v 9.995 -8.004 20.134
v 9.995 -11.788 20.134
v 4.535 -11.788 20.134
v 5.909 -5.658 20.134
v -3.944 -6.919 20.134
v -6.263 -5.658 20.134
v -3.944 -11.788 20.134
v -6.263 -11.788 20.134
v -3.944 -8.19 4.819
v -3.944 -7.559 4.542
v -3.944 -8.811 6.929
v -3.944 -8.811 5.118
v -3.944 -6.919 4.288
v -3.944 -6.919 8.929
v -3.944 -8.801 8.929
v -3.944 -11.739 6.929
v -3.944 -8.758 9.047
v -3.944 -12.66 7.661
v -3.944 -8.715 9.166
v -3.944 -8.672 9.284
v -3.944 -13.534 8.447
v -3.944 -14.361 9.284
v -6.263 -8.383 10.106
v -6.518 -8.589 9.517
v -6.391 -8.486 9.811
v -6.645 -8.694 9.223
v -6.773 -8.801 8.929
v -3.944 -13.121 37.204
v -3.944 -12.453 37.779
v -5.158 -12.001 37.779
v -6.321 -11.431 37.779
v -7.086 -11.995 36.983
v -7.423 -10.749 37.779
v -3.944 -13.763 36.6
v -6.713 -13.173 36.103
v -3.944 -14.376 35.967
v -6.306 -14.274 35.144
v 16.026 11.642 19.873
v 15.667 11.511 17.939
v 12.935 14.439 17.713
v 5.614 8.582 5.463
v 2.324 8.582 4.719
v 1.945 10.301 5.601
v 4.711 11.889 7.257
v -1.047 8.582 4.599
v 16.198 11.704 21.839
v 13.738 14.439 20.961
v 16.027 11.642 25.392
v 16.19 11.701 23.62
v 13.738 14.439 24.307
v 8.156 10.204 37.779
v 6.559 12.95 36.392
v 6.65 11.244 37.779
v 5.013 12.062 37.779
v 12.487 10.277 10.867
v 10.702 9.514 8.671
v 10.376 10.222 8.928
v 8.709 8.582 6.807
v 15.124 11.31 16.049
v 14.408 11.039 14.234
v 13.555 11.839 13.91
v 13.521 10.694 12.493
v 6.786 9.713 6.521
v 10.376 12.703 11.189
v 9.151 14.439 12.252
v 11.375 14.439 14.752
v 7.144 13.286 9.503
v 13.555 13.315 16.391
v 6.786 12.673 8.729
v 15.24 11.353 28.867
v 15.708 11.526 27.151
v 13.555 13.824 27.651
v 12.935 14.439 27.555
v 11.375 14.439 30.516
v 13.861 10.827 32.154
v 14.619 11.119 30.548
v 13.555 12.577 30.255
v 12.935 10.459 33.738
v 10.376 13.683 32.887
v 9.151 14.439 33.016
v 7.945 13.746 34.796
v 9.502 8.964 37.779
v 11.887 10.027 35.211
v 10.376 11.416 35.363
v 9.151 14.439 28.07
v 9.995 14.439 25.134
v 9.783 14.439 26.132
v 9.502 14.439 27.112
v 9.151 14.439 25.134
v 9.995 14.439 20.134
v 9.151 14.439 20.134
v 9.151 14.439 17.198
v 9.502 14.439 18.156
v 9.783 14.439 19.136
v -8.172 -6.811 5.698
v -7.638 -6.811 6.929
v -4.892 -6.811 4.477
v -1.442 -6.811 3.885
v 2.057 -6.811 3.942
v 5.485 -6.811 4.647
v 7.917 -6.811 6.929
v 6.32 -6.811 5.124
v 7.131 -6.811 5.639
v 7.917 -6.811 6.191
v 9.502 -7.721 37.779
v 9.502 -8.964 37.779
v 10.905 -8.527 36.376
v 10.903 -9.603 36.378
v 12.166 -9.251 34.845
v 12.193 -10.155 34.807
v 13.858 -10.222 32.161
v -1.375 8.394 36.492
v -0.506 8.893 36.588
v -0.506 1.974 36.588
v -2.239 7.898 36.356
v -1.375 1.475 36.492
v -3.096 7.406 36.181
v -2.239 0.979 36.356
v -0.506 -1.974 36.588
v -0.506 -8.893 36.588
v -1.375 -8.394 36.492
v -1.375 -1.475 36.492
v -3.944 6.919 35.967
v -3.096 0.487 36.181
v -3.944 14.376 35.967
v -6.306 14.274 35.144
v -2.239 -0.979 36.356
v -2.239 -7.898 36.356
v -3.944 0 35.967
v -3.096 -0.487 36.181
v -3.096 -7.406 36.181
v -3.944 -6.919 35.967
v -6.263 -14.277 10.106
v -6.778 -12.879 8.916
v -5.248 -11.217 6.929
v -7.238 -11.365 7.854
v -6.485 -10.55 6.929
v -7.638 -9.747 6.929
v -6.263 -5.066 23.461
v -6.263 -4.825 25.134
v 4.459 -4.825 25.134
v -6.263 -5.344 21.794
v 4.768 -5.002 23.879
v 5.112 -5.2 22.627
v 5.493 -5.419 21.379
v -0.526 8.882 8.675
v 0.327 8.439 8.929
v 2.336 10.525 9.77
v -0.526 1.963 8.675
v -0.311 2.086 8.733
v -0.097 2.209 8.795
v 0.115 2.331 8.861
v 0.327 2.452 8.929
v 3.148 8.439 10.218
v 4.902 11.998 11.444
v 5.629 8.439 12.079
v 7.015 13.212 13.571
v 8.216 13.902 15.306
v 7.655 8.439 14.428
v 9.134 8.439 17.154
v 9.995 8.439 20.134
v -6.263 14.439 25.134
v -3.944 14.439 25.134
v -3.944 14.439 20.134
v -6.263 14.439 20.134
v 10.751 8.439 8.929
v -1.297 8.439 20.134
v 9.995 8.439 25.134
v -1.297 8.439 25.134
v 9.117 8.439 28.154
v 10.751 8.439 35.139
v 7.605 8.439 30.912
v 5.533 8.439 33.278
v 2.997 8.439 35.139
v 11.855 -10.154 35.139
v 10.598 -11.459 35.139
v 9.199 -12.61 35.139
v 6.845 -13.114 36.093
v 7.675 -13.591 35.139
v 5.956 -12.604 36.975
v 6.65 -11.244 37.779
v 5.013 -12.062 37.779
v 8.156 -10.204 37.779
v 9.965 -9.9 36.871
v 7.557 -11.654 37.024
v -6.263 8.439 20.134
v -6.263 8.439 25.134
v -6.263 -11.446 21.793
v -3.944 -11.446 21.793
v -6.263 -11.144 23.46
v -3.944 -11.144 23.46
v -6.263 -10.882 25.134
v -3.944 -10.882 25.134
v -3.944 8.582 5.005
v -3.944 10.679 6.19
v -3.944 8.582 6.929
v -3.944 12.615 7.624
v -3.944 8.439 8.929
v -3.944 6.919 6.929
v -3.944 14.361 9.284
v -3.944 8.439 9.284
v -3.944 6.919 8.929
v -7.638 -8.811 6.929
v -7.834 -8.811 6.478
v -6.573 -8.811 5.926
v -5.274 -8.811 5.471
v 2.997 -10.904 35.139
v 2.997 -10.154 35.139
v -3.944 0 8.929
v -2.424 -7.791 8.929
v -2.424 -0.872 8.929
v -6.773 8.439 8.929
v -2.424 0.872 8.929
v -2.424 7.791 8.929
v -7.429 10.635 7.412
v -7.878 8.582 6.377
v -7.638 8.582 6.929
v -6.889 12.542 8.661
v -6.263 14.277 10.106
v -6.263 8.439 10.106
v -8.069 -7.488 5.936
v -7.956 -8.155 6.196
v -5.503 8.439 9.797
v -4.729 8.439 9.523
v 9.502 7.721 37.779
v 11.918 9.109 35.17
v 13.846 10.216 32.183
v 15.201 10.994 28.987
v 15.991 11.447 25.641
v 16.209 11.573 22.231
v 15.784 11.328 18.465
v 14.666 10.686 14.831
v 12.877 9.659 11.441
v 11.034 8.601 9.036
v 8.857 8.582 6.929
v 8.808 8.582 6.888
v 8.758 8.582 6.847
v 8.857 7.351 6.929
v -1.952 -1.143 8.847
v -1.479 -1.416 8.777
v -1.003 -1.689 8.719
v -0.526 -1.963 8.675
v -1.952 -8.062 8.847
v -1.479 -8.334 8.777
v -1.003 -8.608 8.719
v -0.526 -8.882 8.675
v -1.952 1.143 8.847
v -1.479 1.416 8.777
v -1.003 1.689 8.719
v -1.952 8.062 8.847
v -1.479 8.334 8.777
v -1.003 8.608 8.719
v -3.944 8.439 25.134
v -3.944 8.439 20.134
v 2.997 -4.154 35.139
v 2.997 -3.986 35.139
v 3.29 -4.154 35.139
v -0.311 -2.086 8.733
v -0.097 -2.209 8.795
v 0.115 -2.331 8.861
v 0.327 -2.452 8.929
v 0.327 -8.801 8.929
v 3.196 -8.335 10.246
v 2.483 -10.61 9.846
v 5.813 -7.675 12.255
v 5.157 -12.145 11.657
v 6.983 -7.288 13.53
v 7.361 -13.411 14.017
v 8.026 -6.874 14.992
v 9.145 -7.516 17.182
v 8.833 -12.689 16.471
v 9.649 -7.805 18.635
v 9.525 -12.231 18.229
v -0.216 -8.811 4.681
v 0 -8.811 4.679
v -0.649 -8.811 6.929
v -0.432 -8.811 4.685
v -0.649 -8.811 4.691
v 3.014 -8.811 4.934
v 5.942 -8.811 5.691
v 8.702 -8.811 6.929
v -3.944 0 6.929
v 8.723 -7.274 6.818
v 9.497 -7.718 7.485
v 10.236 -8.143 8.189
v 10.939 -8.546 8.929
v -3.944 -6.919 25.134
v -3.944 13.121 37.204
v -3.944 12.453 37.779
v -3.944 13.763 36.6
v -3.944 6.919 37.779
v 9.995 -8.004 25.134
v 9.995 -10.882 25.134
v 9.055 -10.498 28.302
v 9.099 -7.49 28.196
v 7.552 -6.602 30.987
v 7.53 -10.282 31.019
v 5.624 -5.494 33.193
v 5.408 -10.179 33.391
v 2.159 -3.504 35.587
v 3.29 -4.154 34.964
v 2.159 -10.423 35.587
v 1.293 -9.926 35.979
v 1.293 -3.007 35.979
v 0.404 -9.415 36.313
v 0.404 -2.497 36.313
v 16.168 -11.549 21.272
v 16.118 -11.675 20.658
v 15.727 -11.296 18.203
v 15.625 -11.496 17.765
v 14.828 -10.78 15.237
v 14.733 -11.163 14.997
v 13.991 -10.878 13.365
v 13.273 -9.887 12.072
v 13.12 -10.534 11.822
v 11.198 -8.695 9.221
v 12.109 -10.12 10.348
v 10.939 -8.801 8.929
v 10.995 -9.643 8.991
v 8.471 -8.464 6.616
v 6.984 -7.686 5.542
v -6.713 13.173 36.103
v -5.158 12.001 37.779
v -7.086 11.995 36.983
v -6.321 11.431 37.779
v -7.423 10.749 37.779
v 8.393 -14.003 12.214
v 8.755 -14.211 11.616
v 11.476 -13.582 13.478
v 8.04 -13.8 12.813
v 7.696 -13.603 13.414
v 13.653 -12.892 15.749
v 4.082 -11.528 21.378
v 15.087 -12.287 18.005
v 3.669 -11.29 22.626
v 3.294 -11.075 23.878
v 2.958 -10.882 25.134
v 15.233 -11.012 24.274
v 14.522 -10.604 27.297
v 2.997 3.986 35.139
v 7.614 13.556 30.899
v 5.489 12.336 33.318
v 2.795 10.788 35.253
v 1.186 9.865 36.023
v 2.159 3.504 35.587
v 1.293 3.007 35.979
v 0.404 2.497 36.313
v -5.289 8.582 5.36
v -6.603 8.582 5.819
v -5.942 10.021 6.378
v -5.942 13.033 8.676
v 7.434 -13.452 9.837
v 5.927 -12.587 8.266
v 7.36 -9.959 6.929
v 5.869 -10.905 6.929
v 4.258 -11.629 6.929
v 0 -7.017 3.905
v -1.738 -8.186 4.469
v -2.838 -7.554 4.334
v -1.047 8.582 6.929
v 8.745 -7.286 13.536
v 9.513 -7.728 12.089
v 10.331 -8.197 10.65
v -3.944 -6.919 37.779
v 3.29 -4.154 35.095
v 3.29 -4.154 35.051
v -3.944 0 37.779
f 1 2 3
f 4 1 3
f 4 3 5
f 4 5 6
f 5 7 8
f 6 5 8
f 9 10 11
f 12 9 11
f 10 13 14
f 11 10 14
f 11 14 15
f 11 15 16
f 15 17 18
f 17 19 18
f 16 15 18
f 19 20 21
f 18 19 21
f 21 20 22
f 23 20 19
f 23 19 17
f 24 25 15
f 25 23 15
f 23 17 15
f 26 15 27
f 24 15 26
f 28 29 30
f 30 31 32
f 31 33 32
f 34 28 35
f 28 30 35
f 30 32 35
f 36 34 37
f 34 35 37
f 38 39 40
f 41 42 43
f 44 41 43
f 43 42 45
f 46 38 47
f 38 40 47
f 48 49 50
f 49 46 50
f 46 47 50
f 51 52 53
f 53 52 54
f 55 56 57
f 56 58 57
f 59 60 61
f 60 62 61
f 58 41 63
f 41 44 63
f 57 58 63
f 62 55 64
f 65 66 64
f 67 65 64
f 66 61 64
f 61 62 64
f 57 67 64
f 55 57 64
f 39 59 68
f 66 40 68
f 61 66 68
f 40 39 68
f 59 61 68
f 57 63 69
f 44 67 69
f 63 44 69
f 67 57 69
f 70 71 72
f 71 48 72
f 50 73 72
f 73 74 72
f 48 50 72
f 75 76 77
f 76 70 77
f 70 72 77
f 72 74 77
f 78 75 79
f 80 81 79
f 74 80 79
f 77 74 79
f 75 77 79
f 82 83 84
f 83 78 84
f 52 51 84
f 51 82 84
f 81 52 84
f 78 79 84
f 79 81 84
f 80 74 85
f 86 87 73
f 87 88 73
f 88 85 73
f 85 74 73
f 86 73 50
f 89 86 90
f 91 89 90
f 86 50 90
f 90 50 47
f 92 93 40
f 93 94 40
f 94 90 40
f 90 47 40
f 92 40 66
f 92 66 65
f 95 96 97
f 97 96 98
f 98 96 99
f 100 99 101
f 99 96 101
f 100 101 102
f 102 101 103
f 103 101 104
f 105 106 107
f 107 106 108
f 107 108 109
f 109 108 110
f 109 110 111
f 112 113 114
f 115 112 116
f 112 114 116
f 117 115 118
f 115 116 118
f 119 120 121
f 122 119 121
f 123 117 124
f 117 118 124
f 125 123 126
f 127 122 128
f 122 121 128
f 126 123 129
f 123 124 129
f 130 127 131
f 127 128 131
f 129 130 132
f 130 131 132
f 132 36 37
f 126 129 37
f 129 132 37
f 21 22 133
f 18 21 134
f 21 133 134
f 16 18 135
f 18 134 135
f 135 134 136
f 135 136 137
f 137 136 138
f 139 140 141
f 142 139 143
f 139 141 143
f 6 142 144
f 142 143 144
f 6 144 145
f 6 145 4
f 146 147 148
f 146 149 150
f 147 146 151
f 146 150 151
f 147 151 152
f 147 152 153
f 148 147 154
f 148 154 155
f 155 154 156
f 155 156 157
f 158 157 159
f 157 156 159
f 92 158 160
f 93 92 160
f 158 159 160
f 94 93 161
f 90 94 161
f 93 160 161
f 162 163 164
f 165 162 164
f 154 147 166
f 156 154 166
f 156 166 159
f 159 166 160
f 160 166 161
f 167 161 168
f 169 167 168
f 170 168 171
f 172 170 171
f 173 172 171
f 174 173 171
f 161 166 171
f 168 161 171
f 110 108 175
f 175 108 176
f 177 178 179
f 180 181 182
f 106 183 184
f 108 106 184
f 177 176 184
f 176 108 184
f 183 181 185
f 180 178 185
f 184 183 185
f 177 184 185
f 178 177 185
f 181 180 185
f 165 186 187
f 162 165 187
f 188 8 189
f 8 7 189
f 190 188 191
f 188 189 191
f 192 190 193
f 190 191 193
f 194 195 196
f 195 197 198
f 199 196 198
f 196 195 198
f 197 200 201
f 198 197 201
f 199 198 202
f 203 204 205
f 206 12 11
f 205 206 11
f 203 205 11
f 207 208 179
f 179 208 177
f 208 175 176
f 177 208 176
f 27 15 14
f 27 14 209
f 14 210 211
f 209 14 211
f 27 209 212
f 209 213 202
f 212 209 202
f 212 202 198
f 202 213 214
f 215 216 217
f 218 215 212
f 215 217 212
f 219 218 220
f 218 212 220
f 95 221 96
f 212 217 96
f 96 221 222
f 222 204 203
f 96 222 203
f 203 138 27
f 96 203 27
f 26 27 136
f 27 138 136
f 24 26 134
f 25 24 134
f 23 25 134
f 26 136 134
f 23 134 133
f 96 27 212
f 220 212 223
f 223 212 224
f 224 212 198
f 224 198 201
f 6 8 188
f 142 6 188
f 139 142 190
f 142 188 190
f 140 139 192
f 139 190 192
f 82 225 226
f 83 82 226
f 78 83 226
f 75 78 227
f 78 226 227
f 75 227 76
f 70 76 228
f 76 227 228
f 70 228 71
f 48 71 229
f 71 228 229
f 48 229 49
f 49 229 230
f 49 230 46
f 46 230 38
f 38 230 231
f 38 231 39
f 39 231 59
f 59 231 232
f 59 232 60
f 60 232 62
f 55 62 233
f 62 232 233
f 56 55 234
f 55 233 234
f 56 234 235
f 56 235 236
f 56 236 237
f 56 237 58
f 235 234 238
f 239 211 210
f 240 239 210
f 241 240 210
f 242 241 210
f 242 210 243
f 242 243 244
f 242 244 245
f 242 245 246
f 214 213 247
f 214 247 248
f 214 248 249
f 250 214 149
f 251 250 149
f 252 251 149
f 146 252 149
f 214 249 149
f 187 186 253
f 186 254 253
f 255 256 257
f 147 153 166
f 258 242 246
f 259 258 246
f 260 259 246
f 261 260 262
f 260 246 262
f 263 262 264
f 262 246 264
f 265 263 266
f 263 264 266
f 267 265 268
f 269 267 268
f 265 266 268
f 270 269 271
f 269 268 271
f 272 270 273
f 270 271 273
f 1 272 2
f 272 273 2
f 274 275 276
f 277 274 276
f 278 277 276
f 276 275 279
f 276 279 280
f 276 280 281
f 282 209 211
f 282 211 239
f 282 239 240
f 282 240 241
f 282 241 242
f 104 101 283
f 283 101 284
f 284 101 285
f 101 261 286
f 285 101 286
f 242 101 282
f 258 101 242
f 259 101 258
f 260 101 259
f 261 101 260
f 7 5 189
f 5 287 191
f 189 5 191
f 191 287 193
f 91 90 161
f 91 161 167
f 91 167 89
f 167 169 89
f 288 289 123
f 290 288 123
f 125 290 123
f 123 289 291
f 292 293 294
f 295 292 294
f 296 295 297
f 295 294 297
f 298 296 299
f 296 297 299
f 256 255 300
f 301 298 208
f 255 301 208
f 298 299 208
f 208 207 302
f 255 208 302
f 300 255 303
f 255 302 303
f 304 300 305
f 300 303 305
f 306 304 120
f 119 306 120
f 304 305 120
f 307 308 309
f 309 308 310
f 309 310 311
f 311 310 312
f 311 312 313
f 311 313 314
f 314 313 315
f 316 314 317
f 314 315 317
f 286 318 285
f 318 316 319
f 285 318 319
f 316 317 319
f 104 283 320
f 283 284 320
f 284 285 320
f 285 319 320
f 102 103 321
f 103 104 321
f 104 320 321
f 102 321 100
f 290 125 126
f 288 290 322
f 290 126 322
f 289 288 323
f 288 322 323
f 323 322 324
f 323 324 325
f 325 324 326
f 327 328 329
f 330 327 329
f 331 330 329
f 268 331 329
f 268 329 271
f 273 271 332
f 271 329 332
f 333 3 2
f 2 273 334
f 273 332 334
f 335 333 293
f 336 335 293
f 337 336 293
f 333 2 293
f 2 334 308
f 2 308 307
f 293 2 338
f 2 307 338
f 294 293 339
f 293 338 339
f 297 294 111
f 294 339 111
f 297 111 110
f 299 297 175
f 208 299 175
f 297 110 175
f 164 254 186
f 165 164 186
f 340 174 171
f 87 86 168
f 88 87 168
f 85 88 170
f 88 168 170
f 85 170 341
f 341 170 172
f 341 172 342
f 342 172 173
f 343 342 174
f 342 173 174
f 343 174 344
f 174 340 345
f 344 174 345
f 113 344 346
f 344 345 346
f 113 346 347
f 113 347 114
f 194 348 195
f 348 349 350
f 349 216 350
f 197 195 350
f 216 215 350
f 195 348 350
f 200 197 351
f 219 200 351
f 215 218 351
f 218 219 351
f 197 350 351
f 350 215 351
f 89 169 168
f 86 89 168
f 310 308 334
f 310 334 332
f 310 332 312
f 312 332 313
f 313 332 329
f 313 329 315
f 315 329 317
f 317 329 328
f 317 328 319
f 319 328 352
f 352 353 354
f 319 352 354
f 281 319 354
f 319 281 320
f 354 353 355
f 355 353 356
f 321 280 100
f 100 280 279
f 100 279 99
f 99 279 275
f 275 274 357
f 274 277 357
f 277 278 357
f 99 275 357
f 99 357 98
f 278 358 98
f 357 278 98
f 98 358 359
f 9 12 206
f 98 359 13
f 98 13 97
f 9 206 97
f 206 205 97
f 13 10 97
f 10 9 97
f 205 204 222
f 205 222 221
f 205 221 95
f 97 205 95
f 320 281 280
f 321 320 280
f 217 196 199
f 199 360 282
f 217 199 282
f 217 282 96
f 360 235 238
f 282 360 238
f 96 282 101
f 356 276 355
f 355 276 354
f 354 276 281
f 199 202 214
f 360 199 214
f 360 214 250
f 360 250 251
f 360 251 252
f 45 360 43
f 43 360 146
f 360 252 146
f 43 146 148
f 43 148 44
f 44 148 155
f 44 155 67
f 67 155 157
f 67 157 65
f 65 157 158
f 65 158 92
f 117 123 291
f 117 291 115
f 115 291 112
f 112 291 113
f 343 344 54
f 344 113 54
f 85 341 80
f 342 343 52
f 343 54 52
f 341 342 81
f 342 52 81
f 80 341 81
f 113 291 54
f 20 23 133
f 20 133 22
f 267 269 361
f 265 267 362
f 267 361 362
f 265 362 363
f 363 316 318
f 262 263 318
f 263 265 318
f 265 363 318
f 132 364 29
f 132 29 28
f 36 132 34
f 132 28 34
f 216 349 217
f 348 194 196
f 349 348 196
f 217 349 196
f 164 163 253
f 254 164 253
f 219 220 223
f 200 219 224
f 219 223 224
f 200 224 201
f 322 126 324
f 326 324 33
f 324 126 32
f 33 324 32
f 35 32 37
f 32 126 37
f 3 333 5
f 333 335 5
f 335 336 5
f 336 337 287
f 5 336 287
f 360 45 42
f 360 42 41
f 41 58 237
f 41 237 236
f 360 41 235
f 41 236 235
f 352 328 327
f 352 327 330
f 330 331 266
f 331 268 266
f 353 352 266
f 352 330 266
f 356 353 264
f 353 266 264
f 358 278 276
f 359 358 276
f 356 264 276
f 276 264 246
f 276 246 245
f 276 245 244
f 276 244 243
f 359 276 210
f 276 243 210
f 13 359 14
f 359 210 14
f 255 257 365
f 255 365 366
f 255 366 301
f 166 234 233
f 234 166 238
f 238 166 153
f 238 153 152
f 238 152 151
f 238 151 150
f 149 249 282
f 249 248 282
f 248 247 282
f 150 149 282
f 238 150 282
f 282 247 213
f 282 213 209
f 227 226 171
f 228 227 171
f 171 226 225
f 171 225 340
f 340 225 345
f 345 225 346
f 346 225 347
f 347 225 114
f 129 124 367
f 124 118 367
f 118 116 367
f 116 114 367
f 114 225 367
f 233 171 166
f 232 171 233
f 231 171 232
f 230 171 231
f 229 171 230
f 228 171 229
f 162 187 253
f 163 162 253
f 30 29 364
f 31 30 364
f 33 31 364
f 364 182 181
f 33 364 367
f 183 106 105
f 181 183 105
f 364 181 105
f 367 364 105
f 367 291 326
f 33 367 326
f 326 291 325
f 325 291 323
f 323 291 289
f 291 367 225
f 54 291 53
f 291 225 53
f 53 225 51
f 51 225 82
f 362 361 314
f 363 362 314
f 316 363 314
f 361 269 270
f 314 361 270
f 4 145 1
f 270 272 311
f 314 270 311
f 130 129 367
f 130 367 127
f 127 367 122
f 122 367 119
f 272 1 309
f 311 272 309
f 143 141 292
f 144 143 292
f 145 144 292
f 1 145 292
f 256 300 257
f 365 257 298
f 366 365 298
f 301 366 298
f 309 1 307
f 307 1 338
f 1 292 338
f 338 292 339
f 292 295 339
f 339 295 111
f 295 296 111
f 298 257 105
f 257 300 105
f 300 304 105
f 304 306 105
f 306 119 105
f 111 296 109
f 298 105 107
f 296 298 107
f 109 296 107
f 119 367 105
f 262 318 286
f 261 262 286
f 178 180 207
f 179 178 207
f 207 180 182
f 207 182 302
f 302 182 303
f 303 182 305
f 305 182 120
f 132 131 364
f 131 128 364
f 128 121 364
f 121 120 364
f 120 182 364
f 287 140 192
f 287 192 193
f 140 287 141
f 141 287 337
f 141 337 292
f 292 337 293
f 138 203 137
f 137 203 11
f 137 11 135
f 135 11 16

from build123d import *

# Parameters (mm, degrees)
F6_DEPTH  = 48.9
F8_DEPTH  = 73.9
F10_DEPTH = 48.9


# Not quite as in the source:
# - a feature names something its author has since deleted; it is built from what else it names


with BuildPart() as f1:
    # F0 (on Front) → F1 (revolve)
    with BuildSketch(Plane.XZ):
        with BuildLine():
            Line((0, 22.6339450173), (20, 22.6339450173))
            ThreePointArc((20, 22.6339450173), (0, 42.6339450173), (-20, 22.6339450173))
            Line((-20, 22.6339450173), (0, 22.6339450173))
        make_face()
    revolve(axis=Axis((-10, 0, 22.6339450173), (1, 0, 0)))

    # F5 (on offset) → F6 (cut)
    with BuildSketch(Plane.XY.offset(43.3)):
        with BuildLine():
            Line((-11.943612595, -16.0421357113), (-11.943612595, 16.0421357113))
            ThreePointArc((-11.943612595, 16.0421357113), (-20, 0), (-11.943612595, -16.0421357113))
        make_face()
        with BuildLine():
            Line((-3.943612595, -16.0421357113), (-11.943612595, -16.0421357113))
            ThreePointArc((-11.943612595, -16.0421357113), (0, -20), (11.943612595, -16.0421357113))
            Line((11.943612595, -16.0421357113), (-3.943612595, -6.9189172936))
            Line((-3.943612595, -6.9189172936), (-3.943612595, -16.0421357113))
        make_face()
        with BuildLine():
            ThreePointArc((20, 0), (19.0478295378, 6.0975560595), (16.2819810101, 11.6145208418))
            Line((16.2819810101, 11.6145208418), (-3.943612595, 0))
            Line((-3.943612595, 0), (16.2819810101, -11.6145208418))
            ThreePointArc((16.2819810101, -11.6145208418), (19.0478295378, -6.0975560595), (20, 0))
        make_face()
        with BuildLine():
            ThreePointArc((11.943612595, 16.0421357113), (0, 20), (-11.943612595, 16.0421357113))
            Line((-11.943612595, 16.0421357113), (-3.943612595, 16.0421357113))
            Line((-3.943612595, 16.0421357113), (-3.943612595, 6.9189172936))
            Line((-3.943612595, 6.9189172936), (11.943612595, 16.0421357113))
        make_face()
    extrude(amount=-F6_DEPTH, mode=Mode.SUBTRACT)

    # F7 (on offset) → F8 (cut)
    with BuildSketch(Plane.XZ.offset(22)):
        with BuildLine():
            ThreePointArc((-8.6470612384, 40.6680330713), (-4.4108839223, 42.0352124388), (0, 42.6339450173))
            ThreePointArc((0, 42.6339450173), (-4.4338605594, 42.1362751484), (-8.6470612384, 40.6680330713))
        make_face()
        with BuildLine():
            ThreePointArc((-8.6470612384, 4.5998569633), (-4.4338605594, 3.1316148863), (0, 2.6339450173))
            ThreePointArc((0, 2.6339450173), (-4.4147481905, 3.2156806169), (-8.6470612384, 4.5998569633))
        make_face()
        with BuildLine():
            ThreePointArc((0, 2.6339450173), (14.1421356237, 8.4918093936), (20, 22.6339450173))
            ThreePointArc((20, 22.6339450173), (14.1421356237, 36.7760806411), (0, 42.6339450173))
            ThreePointArc((0, 42.6339450173), (16.2134145309, 22.6339450173), (0, 2.6339450173))
        make_face()
        with BuildLine():
            Line((-6.3060164348, 35.1435851435), (-8.6470612384, 40.6680330713))
            ThreePointArc((-8.6470612384, 40.6680330713), (-20, 22.6339450173), (-8.6470612384, 4.5998569633))
            Line((-8.6470612384, 4.5998569633), (-6.2630078533, 10.105879966))
            ThreePointArc((-6.2630078533, 10.105879966), (-3.4533212877, 9.1542824914), (-0.5259139232, 8.6745299795))
            ThreePointArc((-0.5259139232, 8.6745299795), (6.4095593768, 12.8665228434), (9.9953882922, 20.1339450173))
            Line((9.9953882922, 20.1339450173), (-6.2630078533, 20.1339450173))
            Line((-6.2630078533, 20.1339450173), (-6.2630078533, 25.1339450173))
            Line((-6.2630078533, 25.1339450173), (9.9953882922, 25.1339450173))
            ThreePointArc((9.9953882922, 25.1339450173), (6.4166339458, 32.3936562253), (-0.5056881537, 36.587979323))
            ThreePointArc((-0.5056881537, 36.587979323), (-3.4625761579, 36.093571181), (-6.3060164348, 35.1435851435))
        make_face()
    extrude(amount=-F8_DEPTH, mode=Mode.SUBTRACT)

    # F9 (on offset) → F10 (cut)
    with BuildSketch(Plane.YZ.offset(22)):
        with BuildLine():
            ThreePointArc((-14.5121786365, 36.3960913333), (-13.8048288932, 37.1055274888), (-13.0628413392, 37.7786528767))
            Line((-13.0628413392, 37.7786528767), (-14.5121786365, 37.7786528767))
            Line((-14.5121786365, 37.7786528767), (-14.5121786365, 36.3960913333))
        make_face()
        with BuildLine():
            Line((-6.8110743198, 3.0763908625), (-6.8110743198, 3.8294437846))
            ThreePointArc((-6.8110743198, 3.8294437846), (-7.8226272385, 4.2272477827), (-8.8110743198, 4.6794199796))
            Line((-8.8110743198, 4.6794199796), (-8.8110743198, 3.0763908625))
            Line((-8.8110743198, 3.0763908625), (-6.8110743198, 3.0763908625))
        make_face()
        with BuildLine():
            Line((10.5821458962, 1.4693343882), (10.5821458962, 5.6628464014))
            ThreePointArc((10.5821458962, 5.6628464014), (9.5977452348, 5.0873417447), (8.5821458962, 4.5688745271))
            Line((8.5821458962, 4.5688745271), (8.5821458962, 1.4693343882))
            Line((8.5821458962, 1.4693343882), (10.5821458962, 1.4693343882))
        make_face()
        with BuildLine():
            Line((-14.5121786365, 35.1386720749), (-14.5121786365, 36.3960913333))
            ThreePointArc((-14.5121786365, 36.3960913333), (-19.9964093785, 23.0129067158), (-15.0231970267, 9.4315379983))
            ThreePointArc((-15.0231970267, 9.4315379983), (-11.3953060336, 22.0590998115), (-10.1536539841, 35.1386720749))
            Line((-10.1536539841, 35.1386720749), (-14.5121786365, 35.1386720749))
        make_face()
        with BuildLine():
            Line((-4.193781408, 37.7786528767), (13.0628413392, 37.7786528767))
            ThreePointArc((13.0628413392, 37.7786528767), (0, 42.6339450173), (-13.0628413392, 37.7786528767))
            Line((-13.0628413392, 37.7786528767), (-4.193781408, 37.7786528767))
        make_face()
        with BuildLine():
            ThreePointArc((14.4385592904, 8.7945806672), (18.5576289677, 15.176438256), (20, 22.6339450173))
            ThreePointArc((20, 22.6339450173), (18.5774537105, 30.041928119), (14.5121786365, 36.3960913333))
            Line((14.5121786365, 36.3960913333), (14.5121786365, 35.1386720749))
            Line((14.5121786365, 35.1386720749), (14.4385592904, 35.1386720749))
            Line((14.4385592904, 35.1386720749), (14.4385592904, 8.9291743934))
            Line((14.4385592904, 8.9291743934), (14.4385592904, 8.7945806672))
        make_face()
        with BuildLine():
            Line((-8.8005206947, 8.9291743934), (8.4385592904, 8.9291743934))
            Line((8.4385592904, 8.9291743934), (8.4385592904, 35.1386720749))
            Line((8.4385592904, 35.1386720749), (-4.1536419204, 35.1386720749))
            ThreePointArc((-4.1536419204, 35.1386720749), (-5.337064627, 21.8318011111), (-8.8005206947, 8.9291743934))
        make_face()
        with BuildLine():
            ThreePointArc((-6.8110743198, 3.8294437846), (0.9596161149, 2.6569798596), (8.5821458962, 4.5688745271))
            Line((8.5821458962, 4.5688745271), (8.5821458962, 6.9291743934))
            Line((8.5821458962, 6.9291743934), (-6.8110743198, 6.9291743934))
            Line((-6.8110743198, 6.9291743934), (-6.8110743198, 3.8294437846))
        make_face()
        with BuildLine():
            Line((-8.8110743198, 6.9291743934), (-9.5599580869, 6.9291743934))
            Line((-9.5599580869, 6.9291743934), (-12.3838677177, 6.9291743934))
            ThreePointArc((-12.3838677177, 6.9291743934), (-10.6570043035, 5.7097534775), (-8.8110743198, 4.6794199796))
            Line((-8.8110743198, 4.6794199796), (-8.8110743198, 6.9291743934))
        make_face()
    extrude(amount=-F10_DEPTH, mode=Mode.SUBTRACT)


solid = f1.part
